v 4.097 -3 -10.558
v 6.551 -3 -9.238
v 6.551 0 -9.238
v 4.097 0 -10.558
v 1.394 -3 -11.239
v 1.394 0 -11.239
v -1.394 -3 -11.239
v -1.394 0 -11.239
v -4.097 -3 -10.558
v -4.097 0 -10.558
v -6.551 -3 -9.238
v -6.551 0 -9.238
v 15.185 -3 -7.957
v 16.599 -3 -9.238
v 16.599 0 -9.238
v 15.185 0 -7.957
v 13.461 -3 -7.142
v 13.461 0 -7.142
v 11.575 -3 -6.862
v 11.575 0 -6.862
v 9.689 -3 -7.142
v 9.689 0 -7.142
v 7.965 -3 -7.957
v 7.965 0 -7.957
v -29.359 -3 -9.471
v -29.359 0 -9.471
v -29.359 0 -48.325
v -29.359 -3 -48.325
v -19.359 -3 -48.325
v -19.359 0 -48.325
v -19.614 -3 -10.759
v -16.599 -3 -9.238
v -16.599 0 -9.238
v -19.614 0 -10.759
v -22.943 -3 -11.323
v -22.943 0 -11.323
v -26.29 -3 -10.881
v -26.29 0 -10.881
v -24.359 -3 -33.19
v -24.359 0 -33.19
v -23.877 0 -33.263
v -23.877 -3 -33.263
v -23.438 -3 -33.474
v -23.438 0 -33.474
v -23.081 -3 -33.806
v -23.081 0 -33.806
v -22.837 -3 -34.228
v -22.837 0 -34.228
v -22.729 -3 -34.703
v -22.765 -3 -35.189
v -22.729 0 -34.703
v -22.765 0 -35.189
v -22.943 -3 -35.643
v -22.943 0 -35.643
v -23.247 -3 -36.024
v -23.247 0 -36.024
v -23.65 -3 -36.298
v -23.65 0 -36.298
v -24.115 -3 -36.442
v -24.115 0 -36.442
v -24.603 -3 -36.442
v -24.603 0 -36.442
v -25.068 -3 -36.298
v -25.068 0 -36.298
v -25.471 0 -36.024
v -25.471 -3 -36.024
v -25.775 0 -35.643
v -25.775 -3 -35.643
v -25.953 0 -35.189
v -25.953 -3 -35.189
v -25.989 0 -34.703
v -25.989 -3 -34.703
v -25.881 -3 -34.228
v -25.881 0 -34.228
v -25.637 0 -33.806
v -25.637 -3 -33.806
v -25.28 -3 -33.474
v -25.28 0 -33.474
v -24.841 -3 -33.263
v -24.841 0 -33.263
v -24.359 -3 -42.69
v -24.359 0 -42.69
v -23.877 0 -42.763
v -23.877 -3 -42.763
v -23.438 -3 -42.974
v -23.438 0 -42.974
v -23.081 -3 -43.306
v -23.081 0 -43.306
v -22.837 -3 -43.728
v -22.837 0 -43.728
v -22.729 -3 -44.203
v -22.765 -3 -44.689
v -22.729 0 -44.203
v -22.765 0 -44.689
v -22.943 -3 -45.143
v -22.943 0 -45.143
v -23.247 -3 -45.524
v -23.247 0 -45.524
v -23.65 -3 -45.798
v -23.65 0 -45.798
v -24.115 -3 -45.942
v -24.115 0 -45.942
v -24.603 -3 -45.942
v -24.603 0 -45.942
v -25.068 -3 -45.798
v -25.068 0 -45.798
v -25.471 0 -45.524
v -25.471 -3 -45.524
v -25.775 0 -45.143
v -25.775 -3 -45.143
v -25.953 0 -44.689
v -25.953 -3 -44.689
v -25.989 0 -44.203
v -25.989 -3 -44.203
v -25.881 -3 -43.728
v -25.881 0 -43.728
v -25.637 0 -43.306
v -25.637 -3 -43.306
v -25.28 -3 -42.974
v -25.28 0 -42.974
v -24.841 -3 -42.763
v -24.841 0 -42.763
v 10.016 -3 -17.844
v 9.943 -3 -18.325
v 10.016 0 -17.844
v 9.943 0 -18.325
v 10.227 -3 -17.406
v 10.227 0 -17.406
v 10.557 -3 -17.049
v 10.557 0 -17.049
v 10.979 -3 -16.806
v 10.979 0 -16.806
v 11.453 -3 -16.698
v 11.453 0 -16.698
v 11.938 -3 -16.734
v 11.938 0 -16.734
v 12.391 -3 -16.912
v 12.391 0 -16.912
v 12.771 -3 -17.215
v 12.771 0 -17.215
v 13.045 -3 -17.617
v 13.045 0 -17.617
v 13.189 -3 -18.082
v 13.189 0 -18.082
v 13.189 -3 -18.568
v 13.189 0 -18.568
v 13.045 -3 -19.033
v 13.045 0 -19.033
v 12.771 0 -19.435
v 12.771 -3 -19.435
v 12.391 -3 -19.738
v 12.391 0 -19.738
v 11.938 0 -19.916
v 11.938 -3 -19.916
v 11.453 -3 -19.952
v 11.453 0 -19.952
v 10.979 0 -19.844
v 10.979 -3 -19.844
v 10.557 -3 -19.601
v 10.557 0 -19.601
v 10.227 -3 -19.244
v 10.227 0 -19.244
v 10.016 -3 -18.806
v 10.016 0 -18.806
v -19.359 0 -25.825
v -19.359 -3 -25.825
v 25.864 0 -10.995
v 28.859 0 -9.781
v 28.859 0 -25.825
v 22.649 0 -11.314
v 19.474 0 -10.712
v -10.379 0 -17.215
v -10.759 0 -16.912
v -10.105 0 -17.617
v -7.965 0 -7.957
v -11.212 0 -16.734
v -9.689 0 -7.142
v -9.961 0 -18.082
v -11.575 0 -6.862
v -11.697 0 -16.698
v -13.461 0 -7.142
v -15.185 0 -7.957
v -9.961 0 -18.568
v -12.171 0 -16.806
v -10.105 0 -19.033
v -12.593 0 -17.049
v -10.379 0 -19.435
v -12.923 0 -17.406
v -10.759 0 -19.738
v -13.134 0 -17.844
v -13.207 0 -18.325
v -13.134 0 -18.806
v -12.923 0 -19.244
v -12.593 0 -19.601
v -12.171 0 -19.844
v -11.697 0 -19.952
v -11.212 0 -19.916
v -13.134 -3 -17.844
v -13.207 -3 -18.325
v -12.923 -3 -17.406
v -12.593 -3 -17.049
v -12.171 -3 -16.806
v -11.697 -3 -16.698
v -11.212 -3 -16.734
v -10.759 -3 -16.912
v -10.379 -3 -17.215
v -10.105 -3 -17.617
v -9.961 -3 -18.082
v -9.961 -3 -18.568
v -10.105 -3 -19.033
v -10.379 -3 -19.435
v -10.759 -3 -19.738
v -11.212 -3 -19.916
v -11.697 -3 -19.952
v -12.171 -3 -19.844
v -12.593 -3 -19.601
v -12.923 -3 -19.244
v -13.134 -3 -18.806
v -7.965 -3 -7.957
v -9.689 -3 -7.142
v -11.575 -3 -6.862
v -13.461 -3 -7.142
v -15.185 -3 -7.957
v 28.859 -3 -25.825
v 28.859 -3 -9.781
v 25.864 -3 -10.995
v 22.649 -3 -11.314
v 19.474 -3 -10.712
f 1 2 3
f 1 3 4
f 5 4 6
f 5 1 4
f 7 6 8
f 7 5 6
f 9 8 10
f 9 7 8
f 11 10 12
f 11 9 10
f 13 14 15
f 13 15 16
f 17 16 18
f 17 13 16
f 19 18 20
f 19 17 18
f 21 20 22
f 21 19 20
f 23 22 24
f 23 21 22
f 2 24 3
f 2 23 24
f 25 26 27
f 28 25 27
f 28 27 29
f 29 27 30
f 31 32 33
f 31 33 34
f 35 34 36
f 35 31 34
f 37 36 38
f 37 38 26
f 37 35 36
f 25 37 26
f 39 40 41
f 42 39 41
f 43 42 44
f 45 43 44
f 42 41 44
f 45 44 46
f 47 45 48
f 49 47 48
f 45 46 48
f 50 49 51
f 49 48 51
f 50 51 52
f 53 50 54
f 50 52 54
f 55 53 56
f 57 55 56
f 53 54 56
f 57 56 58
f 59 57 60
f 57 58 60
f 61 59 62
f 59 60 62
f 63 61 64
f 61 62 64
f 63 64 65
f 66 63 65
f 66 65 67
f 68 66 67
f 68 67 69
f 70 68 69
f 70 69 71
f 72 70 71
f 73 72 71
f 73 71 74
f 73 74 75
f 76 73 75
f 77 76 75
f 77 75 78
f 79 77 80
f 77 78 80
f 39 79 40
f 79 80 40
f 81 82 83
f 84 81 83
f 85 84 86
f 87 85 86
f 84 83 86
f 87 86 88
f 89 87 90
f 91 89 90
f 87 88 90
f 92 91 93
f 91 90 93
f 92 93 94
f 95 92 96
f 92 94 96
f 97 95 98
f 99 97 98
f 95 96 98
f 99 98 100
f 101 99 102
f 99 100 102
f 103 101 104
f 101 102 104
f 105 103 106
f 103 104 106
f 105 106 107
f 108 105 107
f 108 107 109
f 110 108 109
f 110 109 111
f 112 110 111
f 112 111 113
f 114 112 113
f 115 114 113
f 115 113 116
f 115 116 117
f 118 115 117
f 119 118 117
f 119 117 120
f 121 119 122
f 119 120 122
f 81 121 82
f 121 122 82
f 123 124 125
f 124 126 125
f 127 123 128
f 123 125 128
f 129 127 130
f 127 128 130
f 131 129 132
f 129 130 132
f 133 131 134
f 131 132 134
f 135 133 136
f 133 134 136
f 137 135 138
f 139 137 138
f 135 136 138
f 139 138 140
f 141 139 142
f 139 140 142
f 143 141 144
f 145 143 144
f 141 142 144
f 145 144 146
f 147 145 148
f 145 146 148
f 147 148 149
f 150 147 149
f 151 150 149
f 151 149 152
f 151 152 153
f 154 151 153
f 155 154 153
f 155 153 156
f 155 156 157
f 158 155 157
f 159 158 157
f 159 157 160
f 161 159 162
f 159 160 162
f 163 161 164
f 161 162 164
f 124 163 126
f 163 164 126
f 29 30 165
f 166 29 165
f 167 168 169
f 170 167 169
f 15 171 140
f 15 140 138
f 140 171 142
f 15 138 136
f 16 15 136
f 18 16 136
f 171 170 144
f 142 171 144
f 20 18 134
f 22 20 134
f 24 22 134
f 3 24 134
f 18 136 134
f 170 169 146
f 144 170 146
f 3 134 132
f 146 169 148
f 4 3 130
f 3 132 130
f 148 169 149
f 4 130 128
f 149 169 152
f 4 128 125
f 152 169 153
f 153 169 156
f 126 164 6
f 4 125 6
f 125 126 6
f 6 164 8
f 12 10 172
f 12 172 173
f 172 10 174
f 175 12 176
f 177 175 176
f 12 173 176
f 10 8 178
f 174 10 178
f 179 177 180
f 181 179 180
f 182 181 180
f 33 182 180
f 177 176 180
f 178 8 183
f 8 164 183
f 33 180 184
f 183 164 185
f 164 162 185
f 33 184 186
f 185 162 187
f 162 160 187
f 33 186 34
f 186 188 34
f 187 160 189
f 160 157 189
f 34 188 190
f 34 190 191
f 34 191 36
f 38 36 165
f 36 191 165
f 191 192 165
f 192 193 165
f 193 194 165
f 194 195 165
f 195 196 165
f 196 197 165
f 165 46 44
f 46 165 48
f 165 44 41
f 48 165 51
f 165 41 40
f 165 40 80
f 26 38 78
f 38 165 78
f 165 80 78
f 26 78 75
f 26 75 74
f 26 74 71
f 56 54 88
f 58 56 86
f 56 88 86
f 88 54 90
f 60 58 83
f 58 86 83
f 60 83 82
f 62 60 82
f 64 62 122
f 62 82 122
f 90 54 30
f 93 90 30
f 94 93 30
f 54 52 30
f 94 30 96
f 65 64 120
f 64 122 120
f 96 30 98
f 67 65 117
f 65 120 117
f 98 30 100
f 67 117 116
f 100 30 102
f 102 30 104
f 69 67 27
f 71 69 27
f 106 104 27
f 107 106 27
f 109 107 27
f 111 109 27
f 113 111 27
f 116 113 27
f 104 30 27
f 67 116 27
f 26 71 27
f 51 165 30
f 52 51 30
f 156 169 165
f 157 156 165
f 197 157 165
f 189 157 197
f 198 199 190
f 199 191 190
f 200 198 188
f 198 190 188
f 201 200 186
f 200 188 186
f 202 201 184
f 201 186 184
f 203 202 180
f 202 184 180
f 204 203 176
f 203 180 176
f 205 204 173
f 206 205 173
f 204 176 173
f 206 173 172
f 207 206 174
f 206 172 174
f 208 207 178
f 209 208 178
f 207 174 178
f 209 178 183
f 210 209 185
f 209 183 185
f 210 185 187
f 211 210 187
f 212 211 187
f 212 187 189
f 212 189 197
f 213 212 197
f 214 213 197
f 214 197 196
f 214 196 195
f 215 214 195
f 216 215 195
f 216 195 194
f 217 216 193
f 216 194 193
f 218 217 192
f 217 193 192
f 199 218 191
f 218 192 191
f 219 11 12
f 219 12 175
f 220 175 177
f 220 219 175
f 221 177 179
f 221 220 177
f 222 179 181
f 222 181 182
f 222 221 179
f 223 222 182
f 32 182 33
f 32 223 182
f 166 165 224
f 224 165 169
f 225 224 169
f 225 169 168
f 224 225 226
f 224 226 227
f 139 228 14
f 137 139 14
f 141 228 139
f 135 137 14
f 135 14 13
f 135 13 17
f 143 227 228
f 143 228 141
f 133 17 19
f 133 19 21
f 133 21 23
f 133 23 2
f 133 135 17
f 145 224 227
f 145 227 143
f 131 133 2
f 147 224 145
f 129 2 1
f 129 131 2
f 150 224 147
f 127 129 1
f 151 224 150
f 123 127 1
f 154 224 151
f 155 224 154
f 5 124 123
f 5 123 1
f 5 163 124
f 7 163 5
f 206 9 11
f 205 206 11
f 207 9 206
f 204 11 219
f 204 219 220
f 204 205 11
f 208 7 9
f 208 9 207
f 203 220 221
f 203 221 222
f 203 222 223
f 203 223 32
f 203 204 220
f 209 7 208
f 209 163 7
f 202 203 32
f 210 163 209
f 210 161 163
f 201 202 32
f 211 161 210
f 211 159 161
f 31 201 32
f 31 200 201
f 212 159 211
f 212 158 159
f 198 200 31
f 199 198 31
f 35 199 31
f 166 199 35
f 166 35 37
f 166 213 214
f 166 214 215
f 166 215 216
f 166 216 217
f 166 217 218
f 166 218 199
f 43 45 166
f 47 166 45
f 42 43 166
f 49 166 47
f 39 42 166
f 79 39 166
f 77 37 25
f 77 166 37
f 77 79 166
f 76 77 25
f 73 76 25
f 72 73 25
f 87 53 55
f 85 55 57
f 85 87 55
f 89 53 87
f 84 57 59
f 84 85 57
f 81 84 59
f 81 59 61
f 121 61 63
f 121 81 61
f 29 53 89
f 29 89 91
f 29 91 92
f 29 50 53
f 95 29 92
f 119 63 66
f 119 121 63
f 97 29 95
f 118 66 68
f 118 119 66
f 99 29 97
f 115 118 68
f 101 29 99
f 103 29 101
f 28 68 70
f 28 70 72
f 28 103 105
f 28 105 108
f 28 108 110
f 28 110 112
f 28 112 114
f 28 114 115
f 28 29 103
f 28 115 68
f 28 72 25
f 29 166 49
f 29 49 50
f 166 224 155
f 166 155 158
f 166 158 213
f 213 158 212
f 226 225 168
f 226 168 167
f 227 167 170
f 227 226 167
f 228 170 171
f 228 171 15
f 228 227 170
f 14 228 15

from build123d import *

# Parameters (mm, degrees)
BASE_FLANGE1_DEPTH        = 3
SKETCH8_R                 = 1.635
CUT_EXTRUDE1_DEPTH        = 3
F_4_CLEARANCE_HOLE2_D     = 3.2639
F_4_CLEARANCE_HOLE2_DEPTH = 3
F_4_CLEARANCE_HOLE2_TIP   = 0.980574487
CUT_EXTRUDE2_DEPTH        = 3


# Sheet-metal steps are written as plain solids
with BuildPart() as part:
    # Sketch3 → Base-Flange1 (new body)
    with BuildSketch(Plane(origin=(0, 0, 0), x_dir=(1, 0, 0), z_dir=(0, 1, 0))):
        with BuildLine():
            Line((-29.358964924, 8.867320879), (-29.358964924, 25.825))
            Line((-29.358964924, 25.825), (-29.358964924, 48.325))
            Line((-29.358964924, 48.325), (-19.358964924, 48.325))
            Line((-19.358964924, 48.325), (-19.358964924, 25.825))
            Line((-19.358964924, 25.825), (29.358964924, 25.825))
            Line((29.358964924, 25.825), (29.358964924, 8.867320879))
            ThreePointArc((29.358964924, 8.867320879), (23.15, 10.825), (16.941035076, 8.867320879))
            ThreePointArc((16.941035076, 8.867320879), (11.575, 6.362392354), (6.208964924, 8.867320879))
            ThreePointArc((6.208964924, 8.867320879), (0, 10.825), (-6.208964924, 8.867320879))
            ThreePointArc((-6.208964924, 8.867320879), (-11.575, 6.362392354), (-16.941035076, 8.867320879))
            ThreePointArc((-16.941035076, 8.867320879), (-23.15, 10.825), (-29.358964924, 8.867320879))
        make_face()
    extrude(amount=-BASE_FLANGE1_DEPTH)

    # Sketch8 → Cut-Extrude1 (cut)
    with BuildSketch(Plane(origin=(0, 0, 0), x_dir=(1, 0, 0), z_dir=(0, 1, 0))):
        with Locations(Location((-24.358964924, 44.325, 0), (0, 0, 270))):
            Circle(SKETCH8_R)
        with Locations(Location((-24.358964924, 34.825, 0), (0, 0, 270))):
            Circle(SKETCH8_R)
    extrude(amount=-CUT_EXTRUDE1_DEPTH, mode=Mode.SUBTRACT)

    # #4 Clearance Hole2
    with Locations(Plane.XZ.offset(3)):
        with Locations((11.575, -18.325), (-11.575, -18.325)):
            Hole(F_4_CLEARANCE_HOLE2_D / 2, depth=F_4_CLEARANCE_HOLE2_DEPTH)
            with Locations((0, 0, -(F_4_CLEARANCE_HOLE2_DEPTH + F_4_CLEARANCE_HOLE2_TIP / 2))):  # 118° drill point
                Cone(0, F_4_CLEARANCE_HOLE2_D / 2, F_4_CLEARANCE_HOLE2_TIP, mode=Mode.SUBTRACT)

    # Sketch11 → Cut-Extrude2 (cut)
    with BuildSketch(Plane.XZ.offset(3)):
        with BuildLine():
            Line((-29.645753142, -9.276896902), (-29.645753142, -3.891418545))
            Line((-29.645753142, -3.891418545), (33.433786827, -3.891418545))
            Line((33.433786827, -3.891418545), (33.433786827, -25.825))
            Line((33.433786827, -25.825), (28.858964924, -25.825))
            Line((28.858964924, -25.825), (28.858964924, -9.780764004))
            ThreePointArc((28.858964924, -9.780764004), (22.648874034, -11.313907272), (16.598650974, -9.237718925))
            ThreePointArc((16.598650974, -9.237718925), (11.575, -6.862392354), (6.551349026, -9.237718925))
            ThreePointArc((6.551349026, -9.237718925), (0, -11.325), (-6.551349026, -9.237718925))
            ThreePointArc((-6.551349026, -9.237718925), (-11.575, -6.862392354), (-16.598650974, -9.237718925))
            ThreePointArc((-16.598650974, -9.237718925), (-23.115993323, -11.324948942), (-29.645753142, -9.276896902))
        make_face()
    extrude(amount=-CUT_EXTRUDE2_DEPTH, mode=Mode.SUBTRACT)


solid = part.part
